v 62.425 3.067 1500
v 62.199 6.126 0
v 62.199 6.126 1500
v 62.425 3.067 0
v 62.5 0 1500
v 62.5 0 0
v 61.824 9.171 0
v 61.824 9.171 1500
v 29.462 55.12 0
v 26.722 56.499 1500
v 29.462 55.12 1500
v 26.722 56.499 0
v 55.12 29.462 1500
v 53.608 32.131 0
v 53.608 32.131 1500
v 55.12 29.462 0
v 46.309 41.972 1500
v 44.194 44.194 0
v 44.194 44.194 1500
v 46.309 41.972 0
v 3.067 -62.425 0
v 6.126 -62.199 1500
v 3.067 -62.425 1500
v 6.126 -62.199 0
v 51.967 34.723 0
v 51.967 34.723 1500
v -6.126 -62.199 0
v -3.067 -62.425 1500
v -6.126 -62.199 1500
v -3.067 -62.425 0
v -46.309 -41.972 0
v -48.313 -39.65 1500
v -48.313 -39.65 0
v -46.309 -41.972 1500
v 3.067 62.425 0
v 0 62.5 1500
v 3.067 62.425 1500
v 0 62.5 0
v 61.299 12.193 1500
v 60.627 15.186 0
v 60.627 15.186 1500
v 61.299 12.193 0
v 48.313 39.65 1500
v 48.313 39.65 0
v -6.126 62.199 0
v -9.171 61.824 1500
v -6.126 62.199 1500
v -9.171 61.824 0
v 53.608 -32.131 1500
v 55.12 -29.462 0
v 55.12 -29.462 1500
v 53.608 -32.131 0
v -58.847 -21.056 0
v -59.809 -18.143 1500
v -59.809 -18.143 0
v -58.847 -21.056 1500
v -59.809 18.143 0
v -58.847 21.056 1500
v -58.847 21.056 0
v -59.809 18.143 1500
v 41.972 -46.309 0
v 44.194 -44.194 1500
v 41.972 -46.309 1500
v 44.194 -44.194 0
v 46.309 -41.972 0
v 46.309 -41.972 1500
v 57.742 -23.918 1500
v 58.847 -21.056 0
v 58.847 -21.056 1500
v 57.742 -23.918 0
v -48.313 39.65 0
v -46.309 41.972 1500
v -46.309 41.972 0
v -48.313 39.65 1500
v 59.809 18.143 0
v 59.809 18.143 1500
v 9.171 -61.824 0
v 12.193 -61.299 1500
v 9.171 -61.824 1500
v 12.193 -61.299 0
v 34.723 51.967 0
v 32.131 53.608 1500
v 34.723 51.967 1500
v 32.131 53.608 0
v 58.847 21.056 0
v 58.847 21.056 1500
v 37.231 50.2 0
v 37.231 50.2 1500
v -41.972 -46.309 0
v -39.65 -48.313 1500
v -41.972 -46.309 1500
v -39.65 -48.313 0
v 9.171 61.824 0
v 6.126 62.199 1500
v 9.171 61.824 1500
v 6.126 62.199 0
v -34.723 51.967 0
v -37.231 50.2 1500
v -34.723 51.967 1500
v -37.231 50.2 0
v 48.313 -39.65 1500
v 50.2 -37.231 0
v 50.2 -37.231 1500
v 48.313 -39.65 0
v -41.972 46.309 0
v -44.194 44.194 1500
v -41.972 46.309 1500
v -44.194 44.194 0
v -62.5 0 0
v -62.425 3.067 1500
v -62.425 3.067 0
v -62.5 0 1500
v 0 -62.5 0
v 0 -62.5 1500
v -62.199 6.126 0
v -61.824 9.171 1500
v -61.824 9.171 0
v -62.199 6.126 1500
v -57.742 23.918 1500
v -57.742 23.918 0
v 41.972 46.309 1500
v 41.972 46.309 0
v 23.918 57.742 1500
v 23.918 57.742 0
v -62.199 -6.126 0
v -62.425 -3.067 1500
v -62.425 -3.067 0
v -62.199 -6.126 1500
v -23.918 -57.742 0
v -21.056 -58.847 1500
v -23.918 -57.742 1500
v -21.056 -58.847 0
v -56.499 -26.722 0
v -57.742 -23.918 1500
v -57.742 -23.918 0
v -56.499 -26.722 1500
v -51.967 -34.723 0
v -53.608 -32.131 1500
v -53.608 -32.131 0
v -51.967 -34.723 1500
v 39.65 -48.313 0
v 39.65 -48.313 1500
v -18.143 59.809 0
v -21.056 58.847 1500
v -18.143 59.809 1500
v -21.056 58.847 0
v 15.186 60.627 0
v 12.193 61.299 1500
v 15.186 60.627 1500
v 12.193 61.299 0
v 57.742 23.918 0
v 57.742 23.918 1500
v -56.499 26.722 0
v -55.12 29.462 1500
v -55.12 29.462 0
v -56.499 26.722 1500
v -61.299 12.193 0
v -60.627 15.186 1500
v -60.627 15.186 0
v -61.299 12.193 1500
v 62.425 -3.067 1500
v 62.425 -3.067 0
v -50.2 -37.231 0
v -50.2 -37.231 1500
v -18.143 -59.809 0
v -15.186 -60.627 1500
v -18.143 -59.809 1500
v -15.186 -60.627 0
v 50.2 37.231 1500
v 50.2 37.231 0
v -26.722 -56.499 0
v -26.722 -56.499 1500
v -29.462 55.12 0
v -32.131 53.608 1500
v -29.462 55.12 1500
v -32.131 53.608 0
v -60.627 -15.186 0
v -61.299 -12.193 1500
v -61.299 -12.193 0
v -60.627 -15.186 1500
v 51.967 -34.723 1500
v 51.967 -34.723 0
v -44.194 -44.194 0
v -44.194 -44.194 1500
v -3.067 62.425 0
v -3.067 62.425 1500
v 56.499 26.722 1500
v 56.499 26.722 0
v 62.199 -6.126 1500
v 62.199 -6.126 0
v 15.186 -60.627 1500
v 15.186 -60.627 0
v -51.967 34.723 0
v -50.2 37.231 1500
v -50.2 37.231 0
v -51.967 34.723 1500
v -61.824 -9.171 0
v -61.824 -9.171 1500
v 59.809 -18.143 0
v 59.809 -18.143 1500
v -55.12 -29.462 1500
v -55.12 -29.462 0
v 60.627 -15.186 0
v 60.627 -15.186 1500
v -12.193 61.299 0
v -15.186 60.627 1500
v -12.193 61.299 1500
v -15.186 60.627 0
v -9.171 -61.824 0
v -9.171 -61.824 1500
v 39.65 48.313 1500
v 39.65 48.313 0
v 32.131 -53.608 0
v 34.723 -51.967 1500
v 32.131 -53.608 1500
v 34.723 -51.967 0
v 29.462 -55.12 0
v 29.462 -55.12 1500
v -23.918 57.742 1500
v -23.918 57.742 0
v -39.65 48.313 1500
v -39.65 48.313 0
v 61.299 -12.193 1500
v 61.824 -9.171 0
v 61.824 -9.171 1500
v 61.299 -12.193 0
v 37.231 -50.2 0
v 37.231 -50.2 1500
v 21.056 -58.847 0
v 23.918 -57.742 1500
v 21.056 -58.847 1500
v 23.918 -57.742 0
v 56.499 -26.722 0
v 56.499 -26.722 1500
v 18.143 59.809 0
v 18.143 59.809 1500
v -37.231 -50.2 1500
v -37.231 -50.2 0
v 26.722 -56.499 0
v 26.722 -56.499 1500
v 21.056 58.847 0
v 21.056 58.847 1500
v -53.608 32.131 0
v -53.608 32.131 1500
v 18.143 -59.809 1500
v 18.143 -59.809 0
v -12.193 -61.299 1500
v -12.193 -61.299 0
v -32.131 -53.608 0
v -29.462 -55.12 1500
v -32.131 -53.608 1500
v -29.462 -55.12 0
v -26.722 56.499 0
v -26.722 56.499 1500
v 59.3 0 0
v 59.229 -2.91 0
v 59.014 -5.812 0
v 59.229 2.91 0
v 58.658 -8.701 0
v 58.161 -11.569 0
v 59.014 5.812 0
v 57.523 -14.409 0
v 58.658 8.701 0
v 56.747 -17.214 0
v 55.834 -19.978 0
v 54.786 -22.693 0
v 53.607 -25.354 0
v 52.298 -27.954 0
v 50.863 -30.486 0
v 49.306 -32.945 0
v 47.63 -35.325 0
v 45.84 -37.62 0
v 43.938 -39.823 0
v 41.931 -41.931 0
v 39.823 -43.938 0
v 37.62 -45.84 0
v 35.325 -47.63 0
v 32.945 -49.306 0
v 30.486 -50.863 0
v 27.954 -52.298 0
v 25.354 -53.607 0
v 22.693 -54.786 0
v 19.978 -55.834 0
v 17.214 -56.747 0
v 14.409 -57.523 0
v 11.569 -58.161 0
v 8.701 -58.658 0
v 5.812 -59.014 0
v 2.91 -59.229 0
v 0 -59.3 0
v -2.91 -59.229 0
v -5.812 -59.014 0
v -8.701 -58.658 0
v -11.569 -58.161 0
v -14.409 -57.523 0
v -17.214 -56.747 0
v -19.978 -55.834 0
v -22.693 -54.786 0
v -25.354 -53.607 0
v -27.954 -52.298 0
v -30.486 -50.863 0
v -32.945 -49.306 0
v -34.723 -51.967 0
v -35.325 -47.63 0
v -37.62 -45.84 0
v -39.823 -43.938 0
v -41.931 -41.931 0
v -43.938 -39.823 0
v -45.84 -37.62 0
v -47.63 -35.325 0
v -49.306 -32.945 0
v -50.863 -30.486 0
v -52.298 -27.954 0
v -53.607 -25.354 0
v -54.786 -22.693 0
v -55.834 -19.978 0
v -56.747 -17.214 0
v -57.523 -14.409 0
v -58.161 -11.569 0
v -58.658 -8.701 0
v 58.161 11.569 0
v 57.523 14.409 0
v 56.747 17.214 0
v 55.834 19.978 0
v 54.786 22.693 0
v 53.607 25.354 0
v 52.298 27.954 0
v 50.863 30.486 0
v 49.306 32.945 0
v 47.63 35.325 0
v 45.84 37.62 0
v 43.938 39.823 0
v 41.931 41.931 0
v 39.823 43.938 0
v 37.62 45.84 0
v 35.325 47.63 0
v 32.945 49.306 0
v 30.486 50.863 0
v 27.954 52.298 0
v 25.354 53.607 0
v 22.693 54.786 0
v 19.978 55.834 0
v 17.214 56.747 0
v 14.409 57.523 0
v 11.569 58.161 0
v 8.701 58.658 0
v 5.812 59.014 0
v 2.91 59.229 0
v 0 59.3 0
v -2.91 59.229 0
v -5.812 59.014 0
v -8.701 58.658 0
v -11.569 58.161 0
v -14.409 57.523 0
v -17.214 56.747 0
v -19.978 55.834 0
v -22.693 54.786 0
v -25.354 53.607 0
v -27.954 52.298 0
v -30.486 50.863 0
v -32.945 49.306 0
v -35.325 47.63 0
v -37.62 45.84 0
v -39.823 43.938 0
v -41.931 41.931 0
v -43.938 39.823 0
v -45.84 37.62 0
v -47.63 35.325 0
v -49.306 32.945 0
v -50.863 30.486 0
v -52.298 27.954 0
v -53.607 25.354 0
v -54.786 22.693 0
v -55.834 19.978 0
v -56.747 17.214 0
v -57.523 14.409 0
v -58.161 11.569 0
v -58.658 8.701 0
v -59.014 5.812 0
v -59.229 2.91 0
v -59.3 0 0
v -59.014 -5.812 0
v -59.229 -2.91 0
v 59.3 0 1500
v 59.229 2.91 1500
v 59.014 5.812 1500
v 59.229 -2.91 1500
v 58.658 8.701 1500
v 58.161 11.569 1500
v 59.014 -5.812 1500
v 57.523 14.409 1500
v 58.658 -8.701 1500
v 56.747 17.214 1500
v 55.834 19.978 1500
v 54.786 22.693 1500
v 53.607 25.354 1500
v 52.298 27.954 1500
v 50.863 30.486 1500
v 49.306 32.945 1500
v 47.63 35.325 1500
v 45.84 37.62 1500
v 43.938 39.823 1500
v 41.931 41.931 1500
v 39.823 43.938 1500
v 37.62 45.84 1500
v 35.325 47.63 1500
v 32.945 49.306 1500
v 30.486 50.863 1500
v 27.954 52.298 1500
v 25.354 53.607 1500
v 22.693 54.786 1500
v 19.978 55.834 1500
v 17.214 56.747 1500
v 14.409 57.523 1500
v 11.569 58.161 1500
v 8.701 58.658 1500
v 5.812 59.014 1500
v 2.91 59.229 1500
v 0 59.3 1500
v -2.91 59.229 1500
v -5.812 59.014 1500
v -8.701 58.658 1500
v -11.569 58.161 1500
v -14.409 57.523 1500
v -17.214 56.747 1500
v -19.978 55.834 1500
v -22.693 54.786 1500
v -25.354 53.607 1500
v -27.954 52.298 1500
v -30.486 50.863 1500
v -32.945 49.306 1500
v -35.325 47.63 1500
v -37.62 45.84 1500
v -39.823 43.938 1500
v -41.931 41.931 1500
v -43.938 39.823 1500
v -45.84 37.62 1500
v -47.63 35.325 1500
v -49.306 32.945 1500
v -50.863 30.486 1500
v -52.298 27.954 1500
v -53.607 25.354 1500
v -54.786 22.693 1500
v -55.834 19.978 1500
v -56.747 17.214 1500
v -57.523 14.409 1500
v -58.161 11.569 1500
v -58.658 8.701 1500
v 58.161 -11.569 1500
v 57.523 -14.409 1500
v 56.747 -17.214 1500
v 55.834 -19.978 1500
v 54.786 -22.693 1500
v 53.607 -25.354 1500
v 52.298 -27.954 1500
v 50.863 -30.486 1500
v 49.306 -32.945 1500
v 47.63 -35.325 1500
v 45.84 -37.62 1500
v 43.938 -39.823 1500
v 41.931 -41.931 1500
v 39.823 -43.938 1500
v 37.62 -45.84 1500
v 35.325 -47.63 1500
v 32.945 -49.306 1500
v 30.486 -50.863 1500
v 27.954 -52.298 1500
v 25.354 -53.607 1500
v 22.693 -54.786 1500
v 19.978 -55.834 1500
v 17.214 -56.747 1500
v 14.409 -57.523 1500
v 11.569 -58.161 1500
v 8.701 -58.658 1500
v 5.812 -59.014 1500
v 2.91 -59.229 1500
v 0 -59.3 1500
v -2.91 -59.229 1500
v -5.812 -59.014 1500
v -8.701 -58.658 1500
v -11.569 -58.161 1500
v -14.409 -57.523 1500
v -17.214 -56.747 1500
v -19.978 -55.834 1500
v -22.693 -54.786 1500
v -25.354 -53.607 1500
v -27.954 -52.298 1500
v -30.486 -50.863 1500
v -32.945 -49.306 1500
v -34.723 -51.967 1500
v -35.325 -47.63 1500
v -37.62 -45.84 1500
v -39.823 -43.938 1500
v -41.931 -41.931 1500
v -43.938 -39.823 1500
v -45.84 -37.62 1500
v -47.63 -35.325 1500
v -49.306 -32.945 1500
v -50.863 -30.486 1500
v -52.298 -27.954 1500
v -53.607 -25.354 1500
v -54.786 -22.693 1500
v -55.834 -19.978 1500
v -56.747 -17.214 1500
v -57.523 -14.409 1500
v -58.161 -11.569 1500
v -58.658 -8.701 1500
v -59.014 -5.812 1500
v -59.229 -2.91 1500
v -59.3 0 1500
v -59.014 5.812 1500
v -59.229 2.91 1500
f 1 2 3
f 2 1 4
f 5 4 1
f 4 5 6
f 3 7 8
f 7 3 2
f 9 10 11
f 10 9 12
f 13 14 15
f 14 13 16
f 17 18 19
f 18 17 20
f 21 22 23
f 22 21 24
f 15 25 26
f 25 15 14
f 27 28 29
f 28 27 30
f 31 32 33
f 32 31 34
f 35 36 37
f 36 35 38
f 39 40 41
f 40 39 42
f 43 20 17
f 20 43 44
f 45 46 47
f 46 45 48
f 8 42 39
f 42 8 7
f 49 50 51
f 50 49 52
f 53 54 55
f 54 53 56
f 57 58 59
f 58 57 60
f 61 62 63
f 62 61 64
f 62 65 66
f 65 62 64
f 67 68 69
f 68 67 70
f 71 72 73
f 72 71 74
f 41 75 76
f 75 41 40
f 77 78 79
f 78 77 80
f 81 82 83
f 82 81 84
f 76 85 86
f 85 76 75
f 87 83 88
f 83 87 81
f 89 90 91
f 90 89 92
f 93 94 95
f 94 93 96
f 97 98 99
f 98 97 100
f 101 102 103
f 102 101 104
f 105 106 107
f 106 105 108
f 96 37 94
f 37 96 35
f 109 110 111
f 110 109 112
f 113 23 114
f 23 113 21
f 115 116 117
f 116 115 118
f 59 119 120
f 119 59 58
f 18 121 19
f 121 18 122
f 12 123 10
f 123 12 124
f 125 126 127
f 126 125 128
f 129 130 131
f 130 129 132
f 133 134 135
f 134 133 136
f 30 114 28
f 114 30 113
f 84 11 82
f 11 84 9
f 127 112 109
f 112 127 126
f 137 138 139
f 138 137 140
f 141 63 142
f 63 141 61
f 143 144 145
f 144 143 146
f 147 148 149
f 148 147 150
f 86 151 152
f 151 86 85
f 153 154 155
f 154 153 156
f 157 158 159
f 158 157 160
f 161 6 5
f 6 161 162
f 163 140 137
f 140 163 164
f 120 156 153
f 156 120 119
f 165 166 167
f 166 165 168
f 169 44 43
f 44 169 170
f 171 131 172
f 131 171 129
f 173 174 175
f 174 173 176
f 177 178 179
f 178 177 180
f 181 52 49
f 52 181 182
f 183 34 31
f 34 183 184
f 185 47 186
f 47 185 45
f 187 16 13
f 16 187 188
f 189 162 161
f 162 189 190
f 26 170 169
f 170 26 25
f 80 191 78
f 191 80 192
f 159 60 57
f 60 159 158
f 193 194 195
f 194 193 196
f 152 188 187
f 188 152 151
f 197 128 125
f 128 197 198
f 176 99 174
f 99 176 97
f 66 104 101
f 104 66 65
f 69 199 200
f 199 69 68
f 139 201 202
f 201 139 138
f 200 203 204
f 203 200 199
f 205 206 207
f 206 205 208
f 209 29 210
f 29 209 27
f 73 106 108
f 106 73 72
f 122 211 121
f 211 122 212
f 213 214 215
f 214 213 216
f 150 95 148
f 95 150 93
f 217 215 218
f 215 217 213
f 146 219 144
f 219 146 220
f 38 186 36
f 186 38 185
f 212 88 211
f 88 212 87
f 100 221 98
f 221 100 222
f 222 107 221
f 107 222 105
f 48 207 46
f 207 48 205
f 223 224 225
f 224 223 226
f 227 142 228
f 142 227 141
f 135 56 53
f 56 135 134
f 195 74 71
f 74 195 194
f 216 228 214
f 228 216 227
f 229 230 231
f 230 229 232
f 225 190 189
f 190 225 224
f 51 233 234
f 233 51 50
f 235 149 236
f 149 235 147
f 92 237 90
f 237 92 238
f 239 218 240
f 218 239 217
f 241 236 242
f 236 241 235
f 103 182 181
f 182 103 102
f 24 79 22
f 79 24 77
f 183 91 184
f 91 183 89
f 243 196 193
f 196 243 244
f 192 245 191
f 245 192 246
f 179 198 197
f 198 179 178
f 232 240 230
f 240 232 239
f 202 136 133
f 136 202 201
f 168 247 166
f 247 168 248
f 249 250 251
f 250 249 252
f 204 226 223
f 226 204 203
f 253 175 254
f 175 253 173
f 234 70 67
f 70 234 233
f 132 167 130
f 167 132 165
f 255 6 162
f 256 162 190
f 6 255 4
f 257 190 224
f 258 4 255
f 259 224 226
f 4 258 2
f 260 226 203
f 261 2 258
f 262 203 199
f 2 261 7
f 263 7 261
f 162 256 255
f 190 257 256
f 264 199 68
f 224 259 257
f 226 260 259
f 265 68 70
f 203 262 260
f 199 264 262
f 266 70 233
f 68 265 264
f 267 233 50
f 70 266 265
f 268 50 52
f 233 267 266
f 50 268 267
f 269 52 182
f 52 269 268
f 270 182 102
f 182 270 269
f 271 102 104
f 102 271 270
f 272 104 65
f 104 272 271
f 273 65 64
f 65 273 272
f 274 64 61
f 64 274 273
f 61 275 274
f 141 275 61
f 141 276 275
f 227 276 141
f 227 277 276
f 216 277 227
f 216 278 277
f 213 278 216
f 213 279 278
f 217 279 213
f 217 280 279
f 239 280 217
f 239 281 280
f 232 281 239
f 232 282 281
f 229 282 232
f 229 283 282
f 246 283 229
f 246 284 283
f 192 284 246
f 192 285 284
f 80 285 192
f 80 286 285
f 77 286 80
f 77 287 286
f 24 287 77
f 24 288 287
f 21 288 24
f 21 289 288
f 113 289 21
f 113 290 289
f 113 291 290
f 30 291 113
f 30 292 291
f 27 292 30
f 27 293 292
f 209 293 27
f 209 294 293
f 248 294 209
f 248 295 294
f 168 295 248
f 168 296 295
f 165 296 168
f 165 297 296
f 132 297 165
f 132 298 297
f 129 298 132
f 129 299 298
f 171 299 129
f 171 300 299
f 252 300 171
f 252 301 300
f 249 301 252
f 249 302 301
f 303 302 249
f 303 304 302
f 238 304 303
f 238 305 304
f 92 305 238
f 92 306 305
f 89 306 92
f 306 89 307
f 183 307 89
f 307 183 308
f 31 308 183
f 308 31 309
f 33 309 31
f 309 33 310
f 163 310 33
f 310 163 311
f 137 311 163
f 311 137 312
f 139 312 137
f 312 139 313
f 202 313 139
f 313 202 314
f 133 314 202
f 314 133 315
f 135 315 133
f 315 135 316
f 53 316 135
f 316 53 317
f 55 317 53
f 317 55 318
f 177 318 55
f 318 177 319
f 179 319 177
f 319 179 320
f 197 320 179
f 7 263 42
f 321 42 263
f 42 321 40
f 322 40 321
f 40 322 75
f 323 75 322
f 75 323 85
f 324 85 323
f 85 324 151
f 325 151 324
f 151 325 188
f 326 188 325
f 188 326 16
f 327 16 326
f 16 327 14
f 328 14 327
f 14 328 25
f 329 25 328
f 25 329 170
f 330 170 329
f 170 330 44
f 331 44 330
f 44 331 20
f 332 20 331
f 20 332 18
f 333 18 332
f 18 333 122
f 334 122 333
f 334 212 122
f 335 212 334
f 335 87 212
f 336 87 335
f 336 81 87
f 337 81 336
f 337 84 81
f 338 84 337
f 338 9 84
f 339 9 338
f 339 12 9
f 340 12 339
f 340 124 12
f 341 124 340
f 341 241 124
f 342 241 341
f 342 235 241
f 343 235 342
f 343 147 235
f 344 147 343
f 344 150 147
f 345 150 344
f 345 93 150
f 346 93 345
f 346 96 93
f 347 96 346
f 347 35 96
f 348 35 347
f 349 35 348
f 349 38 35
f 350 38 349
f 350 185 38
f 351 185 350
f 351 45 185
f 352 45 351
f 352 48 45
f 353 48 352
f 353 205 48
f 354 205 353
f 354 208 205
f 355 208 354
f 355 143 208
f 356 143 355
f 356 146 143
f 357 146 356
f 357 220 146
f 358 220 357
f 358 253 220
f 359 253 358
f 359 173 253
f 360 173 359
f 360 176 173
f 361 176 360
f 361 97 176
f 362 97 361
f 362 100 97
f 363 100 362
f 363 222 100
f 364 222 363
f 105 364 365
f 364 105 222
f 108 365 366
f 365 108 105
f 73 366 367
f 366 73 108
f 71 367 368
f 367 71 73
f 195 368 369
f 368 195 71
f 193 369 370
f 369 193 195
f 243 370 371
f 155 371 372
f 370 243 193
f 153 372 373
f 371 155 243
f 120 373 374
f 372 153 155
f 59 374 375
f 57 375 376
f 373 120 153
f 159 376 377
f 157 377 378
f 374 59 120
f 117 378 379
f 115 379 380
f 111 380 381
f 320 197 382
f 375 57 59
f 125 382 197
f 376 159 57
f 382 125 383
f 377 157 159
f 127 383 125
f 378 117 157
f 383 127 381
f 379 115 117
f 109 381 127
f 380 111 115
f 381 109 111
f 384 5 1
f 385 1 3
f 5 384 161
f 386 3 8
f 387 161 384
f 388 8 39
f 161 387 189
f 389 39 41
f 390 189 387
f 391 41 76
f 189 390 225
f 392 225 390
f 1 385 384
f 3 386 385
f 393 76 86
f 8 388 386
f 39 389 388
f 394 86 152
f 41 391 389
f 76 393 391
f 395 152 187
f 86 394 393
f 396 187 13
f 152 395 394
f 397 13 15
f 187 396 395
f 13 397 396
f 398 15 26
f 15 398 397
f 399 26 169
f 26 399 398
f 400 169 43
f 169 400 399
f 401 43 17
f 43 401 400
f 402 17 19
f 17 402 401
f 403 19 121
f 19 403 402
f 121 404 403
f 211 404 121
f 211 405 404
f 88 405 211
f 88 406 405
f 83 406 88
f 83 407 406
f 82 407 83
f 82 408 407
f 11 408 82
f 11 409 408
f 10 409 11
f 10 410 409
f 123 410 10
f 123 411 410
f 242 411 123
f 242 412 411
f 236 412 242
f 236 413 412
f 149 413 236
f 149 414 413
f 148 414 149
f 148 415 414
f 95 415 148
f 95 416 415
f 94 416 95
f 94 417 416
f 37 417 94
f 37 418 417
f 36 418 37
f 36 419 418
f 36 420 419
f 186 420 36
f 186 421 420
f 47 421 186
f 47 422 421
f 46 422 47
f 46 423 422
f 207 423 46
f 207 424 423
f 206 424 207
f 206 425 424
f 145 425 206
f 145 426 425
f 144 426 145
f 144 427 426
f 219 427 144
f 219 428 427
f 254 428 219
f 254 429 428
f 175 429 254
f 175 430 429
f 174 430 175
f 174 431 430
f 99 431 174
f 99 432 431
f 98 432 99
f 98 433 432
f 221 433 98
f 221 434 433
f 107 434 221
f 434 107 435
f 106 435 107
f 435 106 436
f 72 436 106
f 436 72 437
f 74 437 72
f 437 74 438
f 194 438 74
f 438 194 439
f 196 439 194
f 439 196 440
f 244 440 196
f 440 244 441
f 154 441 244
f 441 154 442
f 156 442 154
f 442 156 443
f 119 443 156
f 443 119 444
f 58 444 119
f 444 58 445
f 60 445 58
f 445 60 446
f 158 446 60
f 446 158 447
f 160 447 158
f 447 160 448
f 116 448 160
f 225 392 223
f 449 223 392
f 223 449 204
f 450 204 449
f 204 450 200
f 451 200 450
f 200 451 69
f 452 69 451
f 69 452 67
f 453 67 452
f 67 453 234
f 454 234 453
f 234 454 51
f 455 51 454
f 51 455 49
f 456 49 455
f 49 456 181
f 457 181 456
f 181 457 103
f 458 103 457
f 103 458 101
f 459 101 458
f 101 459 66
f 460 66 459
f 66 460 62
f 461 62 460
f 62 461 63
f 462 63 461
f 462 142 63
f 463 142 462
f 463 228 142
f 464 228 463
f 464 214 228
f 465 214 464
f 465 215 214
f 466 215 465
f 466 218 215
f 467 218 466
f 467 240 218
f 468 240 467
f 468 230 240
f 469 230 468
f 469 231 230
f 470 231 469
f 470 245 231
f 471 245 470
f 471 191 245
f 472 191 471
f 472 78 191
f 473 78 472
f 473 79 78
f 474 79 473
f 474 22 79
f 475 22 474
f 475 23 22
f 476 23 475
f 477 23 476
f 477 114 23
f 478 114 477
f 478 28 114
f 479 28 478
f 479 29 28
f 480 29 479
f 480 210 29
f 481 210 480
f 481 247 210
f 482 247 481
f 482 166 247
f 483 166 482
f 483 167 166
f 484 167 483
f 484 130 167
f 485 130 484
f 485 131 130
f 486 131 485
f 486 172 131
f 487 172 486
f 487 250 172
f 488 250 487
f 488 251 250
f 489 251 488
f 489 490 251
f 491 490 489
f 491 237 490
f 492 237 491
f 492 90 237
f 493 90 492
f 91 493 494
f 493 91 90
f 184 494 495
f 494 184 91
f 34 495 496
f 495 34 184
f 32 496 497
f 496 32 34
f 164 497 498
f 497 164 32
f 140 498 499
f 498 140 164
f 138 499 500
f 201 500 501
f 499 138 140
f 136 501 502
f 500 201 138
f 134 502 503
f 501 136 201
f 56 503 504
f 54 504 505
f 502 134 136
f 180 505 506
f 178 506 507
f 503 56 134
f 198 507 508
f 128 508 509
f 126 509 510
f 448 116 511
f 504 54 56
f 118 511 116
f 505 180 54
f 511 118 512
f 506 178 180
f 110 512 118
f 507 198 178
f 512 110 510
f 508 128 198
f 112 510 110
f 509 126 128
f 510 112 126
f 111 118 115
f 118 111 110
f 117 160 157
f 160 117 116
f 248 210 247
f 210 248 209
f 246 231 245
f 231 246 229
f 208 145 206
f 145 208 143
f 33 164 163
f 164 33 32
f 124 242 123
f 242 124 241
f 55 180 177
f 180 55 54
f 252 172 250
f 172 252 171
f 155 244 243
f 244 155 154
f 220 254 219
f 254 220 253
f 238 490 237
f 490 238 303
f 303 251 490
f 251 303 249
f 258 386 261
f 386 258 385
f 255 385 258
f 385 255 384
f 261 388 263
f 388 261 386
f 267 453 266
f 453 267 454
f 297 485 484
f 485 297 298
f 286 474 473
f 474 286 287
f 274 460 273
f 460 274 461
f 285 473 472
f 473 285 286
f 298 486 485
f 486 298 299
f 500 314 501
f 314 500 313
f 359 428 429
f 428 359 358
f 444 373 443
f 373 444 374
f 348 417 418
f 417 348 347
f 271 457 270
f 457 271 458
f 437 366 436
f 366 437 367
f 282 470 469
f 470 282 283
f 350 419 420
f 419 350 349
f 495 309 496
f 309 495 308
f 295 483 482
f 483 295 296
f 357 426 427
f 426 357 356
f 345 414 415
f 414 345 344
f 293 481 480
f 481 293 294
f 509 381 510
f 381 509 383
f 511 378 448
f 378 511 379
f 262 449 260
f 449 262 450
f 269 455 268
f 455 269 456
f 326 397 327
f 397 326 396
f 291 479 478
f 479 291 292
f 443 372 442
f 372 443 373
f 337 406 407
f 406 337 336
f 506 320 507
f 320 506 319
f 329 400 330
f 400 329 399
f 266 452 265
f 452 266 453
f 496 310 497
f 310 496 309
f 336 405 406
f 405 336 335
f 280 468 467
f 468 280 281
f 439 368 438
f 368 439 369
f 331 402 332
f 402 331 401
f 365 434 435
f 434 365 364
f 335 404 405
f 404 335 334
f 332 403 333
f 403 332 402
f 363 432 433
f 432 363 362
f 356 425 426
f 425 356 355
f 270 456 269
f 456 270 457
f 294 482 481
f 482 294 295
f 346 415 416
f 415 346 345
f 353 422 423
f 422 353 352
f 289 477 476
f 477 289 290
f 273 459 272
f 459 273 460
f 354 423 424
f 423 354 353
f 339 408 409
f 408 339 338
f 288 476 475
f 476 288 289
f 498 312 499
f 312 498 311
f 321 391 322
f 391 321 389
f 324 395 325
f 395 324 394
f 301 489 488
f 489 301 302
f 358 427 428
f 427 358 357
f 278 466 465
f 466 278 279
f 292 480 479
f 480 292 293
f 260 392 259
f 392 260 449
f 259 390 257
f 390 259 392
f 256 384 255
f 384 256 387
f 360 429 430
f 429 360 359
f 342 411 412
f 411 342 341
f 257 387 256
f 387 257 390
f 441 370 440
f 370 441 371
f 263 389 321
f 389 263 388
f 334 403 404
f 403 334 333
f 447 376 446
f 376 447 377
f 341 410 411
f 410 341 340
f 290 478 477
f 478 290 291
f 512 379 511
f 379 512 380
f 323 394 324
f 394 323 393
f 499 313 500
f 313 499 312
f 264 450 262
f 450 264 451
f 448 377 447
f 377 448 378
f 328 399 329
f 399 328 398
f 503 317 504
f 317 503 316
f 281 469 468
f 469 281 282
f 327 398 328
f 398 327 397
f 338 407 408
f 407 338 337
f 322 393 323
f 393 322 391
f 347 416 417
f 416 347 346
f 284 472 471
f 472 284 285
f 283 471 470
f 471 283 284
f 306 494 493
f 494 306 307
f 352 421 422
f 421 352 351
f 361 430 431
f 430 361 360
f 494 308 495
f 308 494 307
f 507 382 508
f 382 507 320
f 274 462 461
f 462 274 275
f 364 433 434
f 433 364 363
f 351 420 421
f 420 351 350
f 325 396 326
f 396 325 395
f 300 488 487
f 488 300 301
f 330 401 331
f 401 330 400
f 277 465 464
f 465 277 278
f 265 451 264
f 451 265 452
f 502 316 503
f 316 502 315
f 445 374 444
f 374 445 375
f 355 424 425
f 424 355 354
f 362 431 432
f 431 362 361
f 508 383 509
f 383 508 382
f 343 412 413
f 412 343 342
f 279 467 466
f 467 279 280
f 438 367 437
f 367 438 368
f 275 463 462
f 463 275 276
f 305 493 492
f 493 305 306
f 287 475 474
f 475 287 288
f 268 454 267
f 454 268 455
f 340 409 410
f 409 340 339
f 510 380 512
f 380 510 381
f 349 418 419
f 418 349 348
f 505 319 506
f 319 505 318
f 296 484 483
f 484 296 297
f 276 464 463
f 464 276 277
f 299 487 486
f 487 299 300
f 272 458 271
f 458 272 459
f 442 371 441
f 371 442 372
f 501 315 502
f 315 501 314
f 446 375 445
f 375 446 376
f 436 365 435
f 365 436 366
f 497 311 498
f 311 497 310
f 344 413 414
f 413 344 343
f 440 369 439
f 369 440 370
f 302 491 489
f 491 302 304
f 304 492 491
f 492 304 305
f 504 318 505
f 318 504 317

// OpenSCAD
$fn = 128;

// HT pipe parameters (mm)
pipe_od = 125;        // outer diameter
pipe_length = 1500;   // length
wall_thickness = 3.2; // typical HT pipe wall thickness (approx.)
pipe_id = pipe_od - 2*wall_thickness;

module ht_pipe(od, id, len) {
    difference() {
        cylinder(h = len, d = od, center = false);
        translate([0,0,-0.5])
            cylinder(h = len + 1, d = id, center = false);
    }
}

ht_pipe(pipe_od, pipe_id, pipe_length);
